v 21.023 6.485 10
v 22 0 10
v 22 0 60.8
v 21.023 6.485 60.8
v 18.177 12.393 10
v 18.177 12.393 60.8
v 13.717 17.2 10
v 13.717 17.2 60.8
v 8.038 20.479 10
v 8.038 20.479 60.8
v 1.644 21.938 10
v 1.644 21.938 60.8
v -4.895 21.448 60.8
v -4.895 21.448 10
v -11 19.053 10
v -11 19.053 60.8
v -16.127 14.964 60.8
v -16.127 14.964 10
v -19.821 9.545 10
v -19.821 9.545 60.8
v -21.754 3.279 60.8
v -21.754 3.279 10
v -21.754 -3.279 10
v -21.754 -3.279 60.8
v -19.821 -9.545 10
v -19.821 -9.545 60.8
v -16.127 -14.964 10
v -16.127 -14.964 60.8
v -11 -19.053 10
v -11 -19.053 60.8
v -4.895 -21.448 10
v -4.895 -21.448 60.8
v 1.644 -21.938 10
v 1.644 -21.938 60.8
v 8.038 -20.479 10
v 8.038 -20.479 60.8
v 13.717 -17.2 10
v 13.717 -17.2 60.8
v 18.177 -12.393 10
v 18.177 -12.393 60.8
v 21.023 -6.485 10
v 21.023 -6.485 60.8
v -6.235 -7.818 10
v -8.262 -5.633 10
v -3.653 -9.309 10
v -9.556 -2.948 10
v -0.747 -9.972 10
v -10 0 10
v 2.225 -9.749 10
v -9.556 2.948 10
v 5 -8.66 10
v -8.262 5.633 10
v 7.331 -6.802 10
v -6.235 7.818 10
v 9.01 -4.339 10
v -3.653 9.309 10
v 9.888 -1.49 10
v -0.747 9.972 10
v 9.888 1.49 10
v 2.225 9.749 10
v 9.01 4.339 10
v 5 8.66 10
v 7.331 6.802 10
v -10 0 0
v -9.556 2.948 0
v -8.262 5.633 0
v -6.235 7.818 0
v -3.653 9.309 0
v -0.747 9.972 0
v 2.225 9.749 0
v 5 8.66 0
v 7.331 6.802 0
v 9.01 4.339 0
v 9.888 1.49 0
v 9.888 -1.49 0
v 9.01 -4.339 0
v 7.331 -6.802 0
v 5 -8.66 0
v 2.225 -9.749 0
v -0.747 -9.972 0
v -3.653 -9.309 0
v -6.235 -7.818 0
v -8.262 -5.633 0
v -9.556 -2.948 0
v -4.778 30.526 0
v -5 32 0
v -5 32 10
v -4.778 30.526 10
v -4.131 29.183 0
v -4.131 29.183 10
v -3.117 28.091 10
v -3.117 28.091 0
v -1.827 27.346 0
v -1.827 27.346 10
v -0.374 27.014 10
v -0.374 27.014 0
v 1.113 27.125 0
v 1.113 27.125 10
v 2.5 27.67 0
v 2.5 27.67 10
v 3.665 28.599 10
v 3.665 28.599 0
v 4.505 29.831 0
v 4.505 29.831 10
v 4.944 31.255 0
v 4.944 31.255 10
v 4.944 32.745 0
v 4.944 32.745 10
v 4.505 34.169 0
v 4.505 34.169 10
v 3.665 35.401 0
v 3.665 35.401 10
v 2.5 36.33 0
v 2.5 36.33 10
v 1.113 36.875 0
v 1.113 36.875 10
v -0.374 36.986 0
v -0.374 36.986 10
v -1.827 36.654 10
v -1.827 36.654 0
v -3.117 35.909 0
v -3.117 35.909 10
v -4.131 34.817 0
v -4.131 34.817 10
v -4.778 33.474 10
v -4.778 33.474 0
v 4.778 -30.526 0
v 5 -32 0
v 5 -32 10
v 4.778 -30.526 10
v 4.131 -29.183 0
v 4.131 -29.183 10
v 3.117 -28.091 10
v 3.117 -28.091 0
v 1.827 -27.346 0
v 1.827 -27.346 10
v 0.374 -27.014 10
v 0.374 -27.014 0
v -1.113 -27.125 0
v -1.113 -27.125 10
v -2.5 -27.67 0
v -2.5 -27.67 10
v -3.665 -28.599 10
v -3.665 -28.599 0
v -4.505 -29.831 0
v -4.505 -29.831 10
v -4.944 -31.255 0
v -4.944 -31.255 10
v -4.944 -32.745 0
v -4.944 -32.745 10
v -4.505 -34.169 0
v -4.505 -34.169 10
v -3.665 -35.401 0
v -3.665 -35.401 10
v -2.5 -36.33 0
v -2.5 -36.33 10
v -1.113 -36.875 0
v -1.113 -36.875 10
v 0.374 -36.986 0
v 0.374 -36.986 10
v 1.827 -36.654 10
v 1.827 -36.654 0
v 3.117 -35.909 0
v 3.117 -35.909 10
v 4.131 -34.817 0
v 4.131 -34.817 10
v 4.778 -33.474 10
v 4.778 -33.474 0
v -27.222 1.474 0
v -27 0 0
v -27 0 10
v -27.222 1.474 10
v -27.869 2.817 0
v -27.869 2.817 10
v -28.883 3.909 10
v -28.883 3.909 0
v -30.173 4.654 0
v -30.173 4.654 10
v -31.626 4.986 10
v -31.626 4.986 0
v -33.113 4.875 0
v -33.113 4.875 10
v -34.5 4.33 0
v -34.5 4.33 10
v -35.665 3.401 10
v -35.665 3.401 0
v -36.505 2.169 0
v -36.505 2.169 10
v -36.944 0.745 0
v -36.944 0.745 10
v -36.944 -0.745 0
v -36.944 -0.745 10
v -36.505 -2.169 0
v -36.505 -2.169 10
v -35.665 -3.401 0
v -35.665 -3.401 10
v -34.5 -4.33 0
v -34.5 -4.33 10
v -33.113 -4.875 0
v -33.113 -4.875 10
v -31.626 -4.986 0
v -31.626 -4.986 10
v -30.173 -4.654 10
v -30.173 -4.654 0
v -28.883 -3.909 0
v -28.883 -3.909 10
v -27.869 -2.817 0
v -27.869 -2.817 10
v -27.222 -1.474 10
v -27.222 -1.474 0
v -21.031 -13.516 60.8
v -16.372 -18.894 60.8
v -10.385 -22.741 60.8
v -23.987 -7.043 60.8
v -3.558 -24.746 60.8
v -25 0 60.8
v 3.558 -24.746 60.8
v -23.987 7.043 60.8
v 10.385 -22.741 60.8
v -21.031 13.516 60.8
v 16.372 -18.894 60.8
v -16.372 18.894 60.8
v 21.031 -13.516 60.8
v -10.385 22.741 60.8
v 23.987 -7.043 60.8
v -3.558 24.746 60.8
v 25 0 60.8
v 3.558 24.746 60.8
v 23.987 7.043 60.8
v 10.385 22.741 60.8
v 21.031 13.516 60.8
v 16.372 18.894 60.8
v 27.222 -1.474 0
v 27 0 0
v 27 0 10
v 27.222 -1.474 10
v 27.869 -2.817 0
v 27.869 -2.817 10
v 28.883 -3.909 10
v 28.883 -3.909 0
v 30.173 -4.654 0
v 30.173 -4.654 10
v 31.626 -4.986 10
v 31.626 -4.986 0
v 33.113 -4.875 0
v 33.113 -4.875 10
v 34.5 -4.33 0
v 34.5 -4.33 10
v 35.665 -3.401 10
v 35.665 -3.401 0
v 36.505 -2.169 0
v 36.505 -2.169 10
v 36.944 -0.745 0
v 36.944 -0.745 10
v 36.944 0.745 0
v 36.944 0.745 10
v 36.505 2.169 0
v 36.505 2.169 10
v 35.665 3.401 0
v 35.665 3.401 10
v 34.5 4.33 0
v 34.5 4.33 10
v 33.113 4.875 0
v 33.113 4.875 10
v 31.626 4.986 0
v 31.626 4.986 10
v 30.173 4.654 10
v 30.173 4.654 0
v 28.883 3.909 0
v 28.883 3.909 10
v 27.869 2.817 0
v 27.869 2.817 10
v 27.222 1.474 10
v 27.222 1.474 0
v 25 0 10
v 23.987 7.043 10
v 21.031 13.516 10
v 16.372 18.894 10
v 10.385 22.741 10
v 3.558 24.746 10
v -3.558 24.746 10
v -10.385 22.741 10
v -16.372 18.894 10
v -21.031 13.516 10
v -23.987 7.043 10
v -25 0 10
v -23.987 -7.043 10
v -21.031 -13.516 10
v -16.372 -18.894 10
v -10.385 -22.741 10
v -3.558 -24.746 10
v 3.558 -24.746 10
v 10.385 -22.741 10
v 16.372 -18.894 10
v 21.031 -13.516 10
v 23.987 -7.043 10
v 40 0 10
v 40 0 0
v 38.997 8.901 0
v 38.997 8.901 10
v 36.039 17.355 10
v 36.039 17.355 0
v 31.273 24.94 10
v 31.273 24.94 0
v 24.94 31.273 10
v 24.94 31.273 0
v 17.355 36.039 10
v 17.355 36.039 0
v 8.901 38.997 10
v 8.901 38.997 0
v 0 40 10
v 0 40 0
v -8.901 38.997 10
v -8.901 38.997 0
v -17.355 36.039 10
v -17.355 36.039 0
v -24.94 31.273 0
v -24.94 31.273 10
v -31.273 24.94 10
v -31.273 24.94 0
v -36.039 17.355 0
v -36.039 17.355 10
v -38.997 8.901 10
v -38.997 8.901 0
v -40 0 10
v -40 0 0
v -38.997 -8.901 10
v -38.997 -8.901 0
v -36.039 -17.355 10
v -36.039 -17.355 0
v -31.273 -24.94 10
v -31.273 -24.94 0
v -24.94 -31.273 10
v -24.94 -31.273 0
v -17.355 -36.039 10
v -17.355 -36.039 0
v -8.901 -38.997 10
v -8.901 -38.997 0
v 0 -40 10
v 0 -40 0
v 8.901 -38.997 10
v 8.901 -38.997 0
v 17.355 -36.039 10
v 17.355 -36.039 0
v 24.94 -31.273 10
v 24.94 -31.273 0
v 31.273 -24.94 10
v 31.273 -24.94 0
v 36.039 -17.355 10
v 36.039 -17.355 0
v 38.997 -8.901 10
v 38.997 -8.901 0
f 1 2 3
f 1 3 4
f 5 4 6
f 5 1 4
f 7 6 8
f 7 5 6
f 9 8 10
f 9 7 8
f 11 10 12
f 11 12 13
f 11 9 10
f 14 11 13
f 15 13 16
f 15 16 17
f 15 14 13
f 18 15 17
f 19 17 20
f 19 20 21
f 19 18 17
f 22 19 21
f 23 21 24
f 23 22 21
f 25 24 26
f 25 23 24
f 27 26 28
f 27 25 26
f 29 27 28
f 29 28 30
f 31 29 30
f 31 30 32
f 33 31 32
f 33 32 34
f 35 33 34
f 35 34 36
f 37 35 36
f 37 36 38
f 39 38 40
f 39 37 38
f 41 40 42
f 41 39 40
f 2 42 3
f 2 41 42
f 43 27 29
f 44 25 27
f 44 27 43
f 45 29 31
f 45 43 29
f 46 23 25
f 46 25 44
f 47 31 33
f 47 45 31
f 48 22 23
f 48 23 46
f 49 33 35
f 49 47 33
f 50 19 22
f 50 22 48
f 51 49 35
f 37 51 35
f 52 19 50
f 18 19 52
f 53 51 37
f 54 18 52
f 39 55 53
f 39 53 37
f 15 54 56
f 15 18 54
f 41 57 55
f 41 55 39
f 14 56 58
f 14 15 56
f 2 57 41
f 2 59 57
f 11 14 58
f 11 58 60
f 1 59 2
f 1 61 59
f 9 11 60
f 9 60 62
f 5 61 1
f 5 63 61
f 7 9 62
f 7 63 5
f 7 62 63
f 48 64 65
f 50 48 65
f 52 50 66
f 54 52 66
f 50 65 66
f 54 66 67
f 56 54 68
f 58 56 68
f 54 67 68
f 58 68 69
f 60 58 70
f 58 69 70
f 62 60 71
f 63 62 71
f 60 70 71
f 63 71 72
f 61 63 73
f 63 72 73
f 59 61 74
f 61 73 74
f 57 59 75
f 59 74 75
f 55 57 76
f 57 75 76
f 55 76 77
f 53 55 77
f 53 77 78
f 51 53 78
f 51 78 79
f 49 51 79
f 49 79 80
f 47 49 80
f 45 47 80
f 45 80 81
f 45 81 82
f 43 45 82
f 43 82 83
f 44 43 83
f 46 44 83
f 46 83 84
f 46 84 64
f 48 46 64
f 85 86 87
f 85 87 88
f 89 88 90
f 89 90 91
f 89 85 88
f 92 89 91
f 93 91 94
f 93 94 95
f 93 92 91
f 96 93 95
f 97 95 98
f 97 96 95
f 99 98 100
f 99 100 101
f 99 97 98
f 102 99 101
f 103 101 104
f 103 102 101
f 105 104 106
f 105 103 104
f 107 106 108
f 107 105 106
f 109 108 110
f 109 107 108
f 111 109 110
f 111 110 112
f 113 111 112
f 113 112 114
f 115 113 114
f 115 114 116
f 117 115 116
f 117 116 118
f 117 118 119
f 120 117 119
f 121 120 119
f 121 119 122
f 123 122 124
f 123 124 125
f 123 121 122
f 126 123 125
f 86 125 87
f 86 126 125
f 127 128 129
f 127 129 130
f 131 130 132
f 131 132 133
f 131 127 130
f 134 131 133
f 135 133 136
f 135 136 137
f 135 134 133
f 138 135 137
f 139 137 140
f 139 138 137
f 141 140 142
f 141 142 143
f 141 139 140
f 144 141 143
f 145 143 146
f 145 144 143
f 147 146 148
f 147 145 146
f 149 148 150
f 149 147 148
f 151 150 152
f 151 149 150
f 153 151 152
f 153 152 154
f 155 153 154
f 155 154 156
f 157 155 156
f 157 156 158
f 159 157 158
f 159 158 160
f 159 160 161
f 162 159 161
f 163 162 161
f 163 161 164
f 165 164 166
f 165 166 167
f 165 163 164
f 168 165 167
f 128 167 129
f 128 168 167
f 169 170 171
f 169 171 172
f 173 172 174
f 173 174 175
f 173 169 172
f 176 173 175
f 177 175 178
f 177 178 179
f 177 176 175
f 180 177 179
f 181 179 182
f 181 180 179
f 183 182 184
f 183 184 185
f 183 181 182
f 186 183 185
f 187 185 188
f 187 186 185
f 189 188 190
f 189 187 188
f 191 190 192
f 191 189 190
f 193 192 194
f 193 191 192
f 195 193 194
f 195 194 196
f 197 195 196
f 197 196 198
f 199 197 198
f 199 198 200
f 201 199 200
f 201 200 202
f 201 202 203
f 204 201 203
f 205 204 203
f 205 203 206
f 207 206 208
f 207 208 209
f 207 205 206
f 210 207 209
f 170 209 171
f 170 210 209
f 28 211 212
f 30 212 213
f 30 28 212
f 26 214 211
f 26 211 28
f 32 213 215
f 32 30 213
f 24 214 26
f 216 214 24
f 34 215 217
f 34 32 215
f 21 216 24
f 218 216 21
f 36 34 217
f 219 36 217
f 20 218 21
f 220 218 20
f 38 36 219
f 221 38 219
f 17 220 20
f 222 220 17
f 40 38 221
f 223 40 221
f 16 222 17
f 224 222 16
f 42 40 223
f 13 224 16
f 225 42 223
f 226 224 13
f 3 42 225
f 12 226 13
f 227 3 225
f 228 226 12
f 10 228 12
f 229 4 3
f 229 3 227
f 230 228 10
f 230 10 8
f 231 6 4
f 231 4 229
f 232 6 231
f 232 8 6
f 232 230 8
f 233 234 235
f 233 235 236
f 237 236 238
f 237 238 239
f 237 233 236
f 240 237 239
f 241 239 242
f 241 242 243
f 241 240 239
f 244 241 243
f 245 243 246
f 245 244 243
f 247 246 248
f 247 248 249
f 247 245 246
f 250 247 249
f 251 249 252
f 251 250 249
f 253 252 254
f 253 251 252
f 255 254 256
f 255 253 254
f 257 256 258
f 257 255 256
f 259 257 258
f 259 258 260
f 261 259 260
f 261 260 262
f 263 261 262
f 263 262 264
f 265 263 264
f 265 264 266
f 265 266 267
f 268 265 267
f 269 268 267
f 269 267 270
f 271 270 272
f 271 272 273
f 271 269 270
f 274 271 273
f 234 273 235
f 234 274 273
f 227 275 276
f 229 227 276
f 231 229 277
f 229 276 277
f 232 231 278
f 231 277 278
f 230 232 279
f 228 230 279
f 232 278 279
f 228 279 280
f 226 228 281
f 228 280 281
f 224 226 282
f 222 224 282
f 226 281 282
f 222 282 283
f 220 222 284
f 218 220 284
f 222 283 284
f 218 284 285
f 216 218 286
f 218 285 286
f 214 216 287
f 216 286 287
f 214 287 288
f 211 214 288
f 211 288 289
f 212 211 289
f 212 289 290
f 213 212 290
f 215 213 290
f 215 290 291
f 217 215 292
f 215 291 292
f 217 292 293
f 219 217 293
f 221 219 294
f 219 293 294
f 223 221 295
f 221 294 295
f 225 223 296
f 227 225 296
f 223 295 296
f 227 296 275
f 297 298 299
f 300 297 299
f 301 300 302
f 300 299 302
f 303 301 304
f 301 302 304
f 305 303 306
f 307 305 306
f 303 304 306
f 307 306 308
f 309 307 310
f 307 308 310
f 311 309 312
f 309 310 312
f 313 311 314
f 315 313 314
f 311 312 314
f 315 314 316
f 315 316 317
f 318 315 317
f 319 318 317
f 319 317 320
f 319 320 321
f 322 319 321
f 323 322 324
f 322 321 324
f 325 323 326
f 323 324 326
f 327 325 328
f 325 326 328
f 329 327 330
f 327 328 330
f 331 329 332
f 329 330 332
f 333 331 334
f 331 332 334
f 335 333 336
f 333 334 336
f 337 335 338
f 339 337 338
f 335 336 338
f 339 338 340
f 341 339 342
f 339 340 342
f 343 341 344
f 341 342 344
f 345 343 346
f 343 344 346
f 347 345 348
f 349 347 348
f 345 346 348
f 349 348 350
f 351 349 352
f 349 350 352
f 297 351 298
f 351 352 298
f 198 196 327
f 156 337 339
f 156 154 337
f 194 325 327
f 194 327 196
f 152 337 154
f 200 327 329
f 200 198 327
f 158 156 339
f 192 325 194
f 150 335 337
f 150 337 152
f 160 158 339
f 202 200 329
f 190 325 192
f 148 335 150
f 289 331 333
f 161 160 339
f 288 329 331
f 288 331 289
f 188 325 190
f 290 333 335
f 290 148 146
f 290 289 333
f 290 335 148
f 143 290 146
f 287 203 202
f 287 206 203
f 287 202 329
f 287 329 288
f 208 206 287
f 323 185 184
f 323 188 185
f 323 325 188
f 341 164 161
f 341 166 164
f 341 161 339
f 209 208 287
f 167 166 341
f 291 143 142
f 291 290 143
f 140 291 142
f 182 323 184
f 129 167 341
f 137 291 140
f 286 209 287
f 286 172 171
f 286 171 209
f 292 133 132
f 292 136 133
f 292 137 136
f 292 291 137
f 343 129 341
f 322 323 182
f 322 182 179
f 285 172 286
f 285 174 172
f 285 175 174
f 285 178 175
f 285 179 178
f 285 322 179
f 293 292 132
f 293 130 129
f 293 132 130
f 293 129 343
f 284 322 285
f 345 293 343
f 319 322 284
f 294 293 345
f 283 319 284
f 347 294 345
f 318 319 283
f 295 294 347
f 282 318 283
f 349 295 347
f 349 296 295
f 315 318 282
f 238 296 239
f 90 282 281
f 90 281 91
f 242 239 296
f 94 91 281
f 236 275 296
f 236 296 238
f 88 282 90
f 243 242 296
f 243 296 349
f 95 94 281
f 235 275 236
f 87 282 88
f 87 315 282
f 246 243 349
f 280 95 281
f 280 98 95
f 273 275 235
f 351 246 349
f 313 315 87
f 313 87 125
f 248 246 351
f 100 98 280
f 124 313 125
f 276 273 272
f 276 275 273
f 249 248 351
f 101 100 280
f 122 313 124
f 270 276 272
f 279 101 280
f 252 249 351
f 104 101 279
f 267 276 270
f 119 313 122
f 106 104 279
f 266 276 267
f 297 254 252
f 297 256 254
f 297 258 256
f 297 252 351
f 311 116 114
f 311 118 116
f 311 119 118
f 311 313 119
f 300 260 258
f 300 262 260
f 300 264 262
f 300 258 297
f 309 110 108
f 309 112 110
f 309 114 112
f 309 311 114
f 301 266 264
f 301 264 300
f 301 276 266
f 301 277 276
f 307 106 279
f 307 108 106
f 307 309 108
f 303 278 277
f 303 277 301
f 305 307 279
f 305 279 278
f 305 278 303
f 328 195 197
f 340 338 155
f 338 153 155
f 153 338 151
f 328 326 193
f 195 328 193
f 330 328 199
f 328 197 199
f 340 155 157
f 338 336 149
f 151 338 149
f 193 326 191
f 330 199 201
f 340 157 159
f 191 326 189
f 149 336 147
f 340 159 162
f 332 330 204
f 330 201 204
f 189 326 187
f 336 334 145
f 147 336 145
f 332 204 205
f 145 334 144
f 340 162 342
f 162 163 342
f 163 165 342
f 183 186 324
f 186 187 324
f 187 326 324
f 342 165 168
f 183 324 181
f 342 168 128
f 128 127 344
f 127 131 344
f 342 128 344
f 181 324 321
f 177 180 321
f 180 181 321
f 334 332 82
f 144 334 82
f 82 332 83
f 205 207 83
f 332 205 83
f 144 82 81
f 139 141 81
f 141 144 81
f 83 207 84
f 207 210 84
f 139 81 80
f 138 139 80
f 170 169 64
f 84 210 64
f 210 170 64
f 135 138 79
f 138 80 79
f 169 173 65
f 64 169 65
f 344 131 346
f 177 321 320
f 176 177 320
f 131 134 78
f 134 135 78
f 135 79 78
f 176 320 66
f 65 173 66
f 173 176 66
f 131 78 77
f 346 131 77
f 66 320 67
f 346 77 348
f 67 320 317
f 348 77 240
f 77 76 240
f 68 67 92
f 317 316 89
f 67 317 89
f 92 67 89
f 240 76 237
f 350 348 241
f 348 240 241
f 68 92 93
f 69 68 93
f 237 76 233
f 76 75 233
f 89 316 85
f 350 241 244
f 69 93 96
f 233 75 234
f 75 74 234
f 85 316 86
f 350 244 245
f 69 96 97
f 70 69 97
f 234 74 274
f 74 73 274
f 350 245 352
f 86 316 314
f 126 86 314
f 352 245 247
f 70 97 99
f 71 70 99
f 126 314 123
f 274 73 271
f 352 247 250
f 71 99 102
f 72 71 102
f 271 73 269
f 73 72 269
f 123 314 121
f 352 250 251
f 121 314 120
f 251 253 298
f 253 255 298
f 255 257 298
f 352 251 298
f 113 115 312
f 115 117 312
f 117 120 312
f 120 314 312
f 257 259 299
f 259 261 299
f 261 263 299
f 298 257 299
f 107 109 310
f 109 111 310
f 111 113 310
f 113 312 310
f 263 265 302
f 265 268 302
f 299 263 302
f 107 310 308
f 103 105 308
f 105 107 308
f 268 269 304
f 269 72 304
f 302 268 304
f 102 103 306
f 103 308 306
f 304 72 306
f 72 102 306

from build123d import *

# Parameters (mm, degrees)
SKETCH1_R           = 40
SKETCH1_R_2         = 5
BOSS_EXTRUDE3_DEPTH = 10
SKETCH3_R           = 25
SKETCH3_R_2         = 22
BOSS_EXTRUDE4_DEPTH = 50.8
SKETCH9_R           = 10
CUT_EXTRUDE1_DEPTH  = 100


with BuildPart() as part:
    # Sketch1 → Boss-Extrude3 (new body)
    with BuildSketch(Plane.XY):
        Circle(SKETCH1_R)
        with Locations((0, -32)):
            Circle(SKETCH1_R_2, mode=Mode.SUBTRACT)
        with Locations(Location((0, 32, 0), (0, 0, 180))):
            Circle(SKETCH1_R_2, mode=Mode.SUBTRACT)
        with Locations((-32, 0)):
            Circle(SKETCH1_R_2, mode=Mode.SUBTRACT)
        with Locations(Location((32, 0, 0), (0, 0, 180))):
            Circle(SKETCH1_R_2, mode=Mode.SUBTRACT)
    extrude(amount=BOSS_EXTRUDE3_DEPTH)

    # Sketch3 → Boss-Extrude4 (add)
    with BuildSketch(Plane.XY.offset(10)):
        Circle(SKETCH3_R)
        Circle(SKETCH3_R_2, mode=Mode.SUBTRACT)
    extrude(amount=BOSS_EXTRUDE4_DEPTH)

    # Sketch9 → Cut-Extrude1 (cut)
    with BuildSketch(Plane(origin=(0, 0, 0), x_dir=(-1, 0, 0), z_dir=(0, 0, -1))):
        Circle(SKETCH9_R)
    extrude(amount=-CUT_EXTRUDE1_DEPTH, mode=Mode.SUBTRACT)


solid = part.part
